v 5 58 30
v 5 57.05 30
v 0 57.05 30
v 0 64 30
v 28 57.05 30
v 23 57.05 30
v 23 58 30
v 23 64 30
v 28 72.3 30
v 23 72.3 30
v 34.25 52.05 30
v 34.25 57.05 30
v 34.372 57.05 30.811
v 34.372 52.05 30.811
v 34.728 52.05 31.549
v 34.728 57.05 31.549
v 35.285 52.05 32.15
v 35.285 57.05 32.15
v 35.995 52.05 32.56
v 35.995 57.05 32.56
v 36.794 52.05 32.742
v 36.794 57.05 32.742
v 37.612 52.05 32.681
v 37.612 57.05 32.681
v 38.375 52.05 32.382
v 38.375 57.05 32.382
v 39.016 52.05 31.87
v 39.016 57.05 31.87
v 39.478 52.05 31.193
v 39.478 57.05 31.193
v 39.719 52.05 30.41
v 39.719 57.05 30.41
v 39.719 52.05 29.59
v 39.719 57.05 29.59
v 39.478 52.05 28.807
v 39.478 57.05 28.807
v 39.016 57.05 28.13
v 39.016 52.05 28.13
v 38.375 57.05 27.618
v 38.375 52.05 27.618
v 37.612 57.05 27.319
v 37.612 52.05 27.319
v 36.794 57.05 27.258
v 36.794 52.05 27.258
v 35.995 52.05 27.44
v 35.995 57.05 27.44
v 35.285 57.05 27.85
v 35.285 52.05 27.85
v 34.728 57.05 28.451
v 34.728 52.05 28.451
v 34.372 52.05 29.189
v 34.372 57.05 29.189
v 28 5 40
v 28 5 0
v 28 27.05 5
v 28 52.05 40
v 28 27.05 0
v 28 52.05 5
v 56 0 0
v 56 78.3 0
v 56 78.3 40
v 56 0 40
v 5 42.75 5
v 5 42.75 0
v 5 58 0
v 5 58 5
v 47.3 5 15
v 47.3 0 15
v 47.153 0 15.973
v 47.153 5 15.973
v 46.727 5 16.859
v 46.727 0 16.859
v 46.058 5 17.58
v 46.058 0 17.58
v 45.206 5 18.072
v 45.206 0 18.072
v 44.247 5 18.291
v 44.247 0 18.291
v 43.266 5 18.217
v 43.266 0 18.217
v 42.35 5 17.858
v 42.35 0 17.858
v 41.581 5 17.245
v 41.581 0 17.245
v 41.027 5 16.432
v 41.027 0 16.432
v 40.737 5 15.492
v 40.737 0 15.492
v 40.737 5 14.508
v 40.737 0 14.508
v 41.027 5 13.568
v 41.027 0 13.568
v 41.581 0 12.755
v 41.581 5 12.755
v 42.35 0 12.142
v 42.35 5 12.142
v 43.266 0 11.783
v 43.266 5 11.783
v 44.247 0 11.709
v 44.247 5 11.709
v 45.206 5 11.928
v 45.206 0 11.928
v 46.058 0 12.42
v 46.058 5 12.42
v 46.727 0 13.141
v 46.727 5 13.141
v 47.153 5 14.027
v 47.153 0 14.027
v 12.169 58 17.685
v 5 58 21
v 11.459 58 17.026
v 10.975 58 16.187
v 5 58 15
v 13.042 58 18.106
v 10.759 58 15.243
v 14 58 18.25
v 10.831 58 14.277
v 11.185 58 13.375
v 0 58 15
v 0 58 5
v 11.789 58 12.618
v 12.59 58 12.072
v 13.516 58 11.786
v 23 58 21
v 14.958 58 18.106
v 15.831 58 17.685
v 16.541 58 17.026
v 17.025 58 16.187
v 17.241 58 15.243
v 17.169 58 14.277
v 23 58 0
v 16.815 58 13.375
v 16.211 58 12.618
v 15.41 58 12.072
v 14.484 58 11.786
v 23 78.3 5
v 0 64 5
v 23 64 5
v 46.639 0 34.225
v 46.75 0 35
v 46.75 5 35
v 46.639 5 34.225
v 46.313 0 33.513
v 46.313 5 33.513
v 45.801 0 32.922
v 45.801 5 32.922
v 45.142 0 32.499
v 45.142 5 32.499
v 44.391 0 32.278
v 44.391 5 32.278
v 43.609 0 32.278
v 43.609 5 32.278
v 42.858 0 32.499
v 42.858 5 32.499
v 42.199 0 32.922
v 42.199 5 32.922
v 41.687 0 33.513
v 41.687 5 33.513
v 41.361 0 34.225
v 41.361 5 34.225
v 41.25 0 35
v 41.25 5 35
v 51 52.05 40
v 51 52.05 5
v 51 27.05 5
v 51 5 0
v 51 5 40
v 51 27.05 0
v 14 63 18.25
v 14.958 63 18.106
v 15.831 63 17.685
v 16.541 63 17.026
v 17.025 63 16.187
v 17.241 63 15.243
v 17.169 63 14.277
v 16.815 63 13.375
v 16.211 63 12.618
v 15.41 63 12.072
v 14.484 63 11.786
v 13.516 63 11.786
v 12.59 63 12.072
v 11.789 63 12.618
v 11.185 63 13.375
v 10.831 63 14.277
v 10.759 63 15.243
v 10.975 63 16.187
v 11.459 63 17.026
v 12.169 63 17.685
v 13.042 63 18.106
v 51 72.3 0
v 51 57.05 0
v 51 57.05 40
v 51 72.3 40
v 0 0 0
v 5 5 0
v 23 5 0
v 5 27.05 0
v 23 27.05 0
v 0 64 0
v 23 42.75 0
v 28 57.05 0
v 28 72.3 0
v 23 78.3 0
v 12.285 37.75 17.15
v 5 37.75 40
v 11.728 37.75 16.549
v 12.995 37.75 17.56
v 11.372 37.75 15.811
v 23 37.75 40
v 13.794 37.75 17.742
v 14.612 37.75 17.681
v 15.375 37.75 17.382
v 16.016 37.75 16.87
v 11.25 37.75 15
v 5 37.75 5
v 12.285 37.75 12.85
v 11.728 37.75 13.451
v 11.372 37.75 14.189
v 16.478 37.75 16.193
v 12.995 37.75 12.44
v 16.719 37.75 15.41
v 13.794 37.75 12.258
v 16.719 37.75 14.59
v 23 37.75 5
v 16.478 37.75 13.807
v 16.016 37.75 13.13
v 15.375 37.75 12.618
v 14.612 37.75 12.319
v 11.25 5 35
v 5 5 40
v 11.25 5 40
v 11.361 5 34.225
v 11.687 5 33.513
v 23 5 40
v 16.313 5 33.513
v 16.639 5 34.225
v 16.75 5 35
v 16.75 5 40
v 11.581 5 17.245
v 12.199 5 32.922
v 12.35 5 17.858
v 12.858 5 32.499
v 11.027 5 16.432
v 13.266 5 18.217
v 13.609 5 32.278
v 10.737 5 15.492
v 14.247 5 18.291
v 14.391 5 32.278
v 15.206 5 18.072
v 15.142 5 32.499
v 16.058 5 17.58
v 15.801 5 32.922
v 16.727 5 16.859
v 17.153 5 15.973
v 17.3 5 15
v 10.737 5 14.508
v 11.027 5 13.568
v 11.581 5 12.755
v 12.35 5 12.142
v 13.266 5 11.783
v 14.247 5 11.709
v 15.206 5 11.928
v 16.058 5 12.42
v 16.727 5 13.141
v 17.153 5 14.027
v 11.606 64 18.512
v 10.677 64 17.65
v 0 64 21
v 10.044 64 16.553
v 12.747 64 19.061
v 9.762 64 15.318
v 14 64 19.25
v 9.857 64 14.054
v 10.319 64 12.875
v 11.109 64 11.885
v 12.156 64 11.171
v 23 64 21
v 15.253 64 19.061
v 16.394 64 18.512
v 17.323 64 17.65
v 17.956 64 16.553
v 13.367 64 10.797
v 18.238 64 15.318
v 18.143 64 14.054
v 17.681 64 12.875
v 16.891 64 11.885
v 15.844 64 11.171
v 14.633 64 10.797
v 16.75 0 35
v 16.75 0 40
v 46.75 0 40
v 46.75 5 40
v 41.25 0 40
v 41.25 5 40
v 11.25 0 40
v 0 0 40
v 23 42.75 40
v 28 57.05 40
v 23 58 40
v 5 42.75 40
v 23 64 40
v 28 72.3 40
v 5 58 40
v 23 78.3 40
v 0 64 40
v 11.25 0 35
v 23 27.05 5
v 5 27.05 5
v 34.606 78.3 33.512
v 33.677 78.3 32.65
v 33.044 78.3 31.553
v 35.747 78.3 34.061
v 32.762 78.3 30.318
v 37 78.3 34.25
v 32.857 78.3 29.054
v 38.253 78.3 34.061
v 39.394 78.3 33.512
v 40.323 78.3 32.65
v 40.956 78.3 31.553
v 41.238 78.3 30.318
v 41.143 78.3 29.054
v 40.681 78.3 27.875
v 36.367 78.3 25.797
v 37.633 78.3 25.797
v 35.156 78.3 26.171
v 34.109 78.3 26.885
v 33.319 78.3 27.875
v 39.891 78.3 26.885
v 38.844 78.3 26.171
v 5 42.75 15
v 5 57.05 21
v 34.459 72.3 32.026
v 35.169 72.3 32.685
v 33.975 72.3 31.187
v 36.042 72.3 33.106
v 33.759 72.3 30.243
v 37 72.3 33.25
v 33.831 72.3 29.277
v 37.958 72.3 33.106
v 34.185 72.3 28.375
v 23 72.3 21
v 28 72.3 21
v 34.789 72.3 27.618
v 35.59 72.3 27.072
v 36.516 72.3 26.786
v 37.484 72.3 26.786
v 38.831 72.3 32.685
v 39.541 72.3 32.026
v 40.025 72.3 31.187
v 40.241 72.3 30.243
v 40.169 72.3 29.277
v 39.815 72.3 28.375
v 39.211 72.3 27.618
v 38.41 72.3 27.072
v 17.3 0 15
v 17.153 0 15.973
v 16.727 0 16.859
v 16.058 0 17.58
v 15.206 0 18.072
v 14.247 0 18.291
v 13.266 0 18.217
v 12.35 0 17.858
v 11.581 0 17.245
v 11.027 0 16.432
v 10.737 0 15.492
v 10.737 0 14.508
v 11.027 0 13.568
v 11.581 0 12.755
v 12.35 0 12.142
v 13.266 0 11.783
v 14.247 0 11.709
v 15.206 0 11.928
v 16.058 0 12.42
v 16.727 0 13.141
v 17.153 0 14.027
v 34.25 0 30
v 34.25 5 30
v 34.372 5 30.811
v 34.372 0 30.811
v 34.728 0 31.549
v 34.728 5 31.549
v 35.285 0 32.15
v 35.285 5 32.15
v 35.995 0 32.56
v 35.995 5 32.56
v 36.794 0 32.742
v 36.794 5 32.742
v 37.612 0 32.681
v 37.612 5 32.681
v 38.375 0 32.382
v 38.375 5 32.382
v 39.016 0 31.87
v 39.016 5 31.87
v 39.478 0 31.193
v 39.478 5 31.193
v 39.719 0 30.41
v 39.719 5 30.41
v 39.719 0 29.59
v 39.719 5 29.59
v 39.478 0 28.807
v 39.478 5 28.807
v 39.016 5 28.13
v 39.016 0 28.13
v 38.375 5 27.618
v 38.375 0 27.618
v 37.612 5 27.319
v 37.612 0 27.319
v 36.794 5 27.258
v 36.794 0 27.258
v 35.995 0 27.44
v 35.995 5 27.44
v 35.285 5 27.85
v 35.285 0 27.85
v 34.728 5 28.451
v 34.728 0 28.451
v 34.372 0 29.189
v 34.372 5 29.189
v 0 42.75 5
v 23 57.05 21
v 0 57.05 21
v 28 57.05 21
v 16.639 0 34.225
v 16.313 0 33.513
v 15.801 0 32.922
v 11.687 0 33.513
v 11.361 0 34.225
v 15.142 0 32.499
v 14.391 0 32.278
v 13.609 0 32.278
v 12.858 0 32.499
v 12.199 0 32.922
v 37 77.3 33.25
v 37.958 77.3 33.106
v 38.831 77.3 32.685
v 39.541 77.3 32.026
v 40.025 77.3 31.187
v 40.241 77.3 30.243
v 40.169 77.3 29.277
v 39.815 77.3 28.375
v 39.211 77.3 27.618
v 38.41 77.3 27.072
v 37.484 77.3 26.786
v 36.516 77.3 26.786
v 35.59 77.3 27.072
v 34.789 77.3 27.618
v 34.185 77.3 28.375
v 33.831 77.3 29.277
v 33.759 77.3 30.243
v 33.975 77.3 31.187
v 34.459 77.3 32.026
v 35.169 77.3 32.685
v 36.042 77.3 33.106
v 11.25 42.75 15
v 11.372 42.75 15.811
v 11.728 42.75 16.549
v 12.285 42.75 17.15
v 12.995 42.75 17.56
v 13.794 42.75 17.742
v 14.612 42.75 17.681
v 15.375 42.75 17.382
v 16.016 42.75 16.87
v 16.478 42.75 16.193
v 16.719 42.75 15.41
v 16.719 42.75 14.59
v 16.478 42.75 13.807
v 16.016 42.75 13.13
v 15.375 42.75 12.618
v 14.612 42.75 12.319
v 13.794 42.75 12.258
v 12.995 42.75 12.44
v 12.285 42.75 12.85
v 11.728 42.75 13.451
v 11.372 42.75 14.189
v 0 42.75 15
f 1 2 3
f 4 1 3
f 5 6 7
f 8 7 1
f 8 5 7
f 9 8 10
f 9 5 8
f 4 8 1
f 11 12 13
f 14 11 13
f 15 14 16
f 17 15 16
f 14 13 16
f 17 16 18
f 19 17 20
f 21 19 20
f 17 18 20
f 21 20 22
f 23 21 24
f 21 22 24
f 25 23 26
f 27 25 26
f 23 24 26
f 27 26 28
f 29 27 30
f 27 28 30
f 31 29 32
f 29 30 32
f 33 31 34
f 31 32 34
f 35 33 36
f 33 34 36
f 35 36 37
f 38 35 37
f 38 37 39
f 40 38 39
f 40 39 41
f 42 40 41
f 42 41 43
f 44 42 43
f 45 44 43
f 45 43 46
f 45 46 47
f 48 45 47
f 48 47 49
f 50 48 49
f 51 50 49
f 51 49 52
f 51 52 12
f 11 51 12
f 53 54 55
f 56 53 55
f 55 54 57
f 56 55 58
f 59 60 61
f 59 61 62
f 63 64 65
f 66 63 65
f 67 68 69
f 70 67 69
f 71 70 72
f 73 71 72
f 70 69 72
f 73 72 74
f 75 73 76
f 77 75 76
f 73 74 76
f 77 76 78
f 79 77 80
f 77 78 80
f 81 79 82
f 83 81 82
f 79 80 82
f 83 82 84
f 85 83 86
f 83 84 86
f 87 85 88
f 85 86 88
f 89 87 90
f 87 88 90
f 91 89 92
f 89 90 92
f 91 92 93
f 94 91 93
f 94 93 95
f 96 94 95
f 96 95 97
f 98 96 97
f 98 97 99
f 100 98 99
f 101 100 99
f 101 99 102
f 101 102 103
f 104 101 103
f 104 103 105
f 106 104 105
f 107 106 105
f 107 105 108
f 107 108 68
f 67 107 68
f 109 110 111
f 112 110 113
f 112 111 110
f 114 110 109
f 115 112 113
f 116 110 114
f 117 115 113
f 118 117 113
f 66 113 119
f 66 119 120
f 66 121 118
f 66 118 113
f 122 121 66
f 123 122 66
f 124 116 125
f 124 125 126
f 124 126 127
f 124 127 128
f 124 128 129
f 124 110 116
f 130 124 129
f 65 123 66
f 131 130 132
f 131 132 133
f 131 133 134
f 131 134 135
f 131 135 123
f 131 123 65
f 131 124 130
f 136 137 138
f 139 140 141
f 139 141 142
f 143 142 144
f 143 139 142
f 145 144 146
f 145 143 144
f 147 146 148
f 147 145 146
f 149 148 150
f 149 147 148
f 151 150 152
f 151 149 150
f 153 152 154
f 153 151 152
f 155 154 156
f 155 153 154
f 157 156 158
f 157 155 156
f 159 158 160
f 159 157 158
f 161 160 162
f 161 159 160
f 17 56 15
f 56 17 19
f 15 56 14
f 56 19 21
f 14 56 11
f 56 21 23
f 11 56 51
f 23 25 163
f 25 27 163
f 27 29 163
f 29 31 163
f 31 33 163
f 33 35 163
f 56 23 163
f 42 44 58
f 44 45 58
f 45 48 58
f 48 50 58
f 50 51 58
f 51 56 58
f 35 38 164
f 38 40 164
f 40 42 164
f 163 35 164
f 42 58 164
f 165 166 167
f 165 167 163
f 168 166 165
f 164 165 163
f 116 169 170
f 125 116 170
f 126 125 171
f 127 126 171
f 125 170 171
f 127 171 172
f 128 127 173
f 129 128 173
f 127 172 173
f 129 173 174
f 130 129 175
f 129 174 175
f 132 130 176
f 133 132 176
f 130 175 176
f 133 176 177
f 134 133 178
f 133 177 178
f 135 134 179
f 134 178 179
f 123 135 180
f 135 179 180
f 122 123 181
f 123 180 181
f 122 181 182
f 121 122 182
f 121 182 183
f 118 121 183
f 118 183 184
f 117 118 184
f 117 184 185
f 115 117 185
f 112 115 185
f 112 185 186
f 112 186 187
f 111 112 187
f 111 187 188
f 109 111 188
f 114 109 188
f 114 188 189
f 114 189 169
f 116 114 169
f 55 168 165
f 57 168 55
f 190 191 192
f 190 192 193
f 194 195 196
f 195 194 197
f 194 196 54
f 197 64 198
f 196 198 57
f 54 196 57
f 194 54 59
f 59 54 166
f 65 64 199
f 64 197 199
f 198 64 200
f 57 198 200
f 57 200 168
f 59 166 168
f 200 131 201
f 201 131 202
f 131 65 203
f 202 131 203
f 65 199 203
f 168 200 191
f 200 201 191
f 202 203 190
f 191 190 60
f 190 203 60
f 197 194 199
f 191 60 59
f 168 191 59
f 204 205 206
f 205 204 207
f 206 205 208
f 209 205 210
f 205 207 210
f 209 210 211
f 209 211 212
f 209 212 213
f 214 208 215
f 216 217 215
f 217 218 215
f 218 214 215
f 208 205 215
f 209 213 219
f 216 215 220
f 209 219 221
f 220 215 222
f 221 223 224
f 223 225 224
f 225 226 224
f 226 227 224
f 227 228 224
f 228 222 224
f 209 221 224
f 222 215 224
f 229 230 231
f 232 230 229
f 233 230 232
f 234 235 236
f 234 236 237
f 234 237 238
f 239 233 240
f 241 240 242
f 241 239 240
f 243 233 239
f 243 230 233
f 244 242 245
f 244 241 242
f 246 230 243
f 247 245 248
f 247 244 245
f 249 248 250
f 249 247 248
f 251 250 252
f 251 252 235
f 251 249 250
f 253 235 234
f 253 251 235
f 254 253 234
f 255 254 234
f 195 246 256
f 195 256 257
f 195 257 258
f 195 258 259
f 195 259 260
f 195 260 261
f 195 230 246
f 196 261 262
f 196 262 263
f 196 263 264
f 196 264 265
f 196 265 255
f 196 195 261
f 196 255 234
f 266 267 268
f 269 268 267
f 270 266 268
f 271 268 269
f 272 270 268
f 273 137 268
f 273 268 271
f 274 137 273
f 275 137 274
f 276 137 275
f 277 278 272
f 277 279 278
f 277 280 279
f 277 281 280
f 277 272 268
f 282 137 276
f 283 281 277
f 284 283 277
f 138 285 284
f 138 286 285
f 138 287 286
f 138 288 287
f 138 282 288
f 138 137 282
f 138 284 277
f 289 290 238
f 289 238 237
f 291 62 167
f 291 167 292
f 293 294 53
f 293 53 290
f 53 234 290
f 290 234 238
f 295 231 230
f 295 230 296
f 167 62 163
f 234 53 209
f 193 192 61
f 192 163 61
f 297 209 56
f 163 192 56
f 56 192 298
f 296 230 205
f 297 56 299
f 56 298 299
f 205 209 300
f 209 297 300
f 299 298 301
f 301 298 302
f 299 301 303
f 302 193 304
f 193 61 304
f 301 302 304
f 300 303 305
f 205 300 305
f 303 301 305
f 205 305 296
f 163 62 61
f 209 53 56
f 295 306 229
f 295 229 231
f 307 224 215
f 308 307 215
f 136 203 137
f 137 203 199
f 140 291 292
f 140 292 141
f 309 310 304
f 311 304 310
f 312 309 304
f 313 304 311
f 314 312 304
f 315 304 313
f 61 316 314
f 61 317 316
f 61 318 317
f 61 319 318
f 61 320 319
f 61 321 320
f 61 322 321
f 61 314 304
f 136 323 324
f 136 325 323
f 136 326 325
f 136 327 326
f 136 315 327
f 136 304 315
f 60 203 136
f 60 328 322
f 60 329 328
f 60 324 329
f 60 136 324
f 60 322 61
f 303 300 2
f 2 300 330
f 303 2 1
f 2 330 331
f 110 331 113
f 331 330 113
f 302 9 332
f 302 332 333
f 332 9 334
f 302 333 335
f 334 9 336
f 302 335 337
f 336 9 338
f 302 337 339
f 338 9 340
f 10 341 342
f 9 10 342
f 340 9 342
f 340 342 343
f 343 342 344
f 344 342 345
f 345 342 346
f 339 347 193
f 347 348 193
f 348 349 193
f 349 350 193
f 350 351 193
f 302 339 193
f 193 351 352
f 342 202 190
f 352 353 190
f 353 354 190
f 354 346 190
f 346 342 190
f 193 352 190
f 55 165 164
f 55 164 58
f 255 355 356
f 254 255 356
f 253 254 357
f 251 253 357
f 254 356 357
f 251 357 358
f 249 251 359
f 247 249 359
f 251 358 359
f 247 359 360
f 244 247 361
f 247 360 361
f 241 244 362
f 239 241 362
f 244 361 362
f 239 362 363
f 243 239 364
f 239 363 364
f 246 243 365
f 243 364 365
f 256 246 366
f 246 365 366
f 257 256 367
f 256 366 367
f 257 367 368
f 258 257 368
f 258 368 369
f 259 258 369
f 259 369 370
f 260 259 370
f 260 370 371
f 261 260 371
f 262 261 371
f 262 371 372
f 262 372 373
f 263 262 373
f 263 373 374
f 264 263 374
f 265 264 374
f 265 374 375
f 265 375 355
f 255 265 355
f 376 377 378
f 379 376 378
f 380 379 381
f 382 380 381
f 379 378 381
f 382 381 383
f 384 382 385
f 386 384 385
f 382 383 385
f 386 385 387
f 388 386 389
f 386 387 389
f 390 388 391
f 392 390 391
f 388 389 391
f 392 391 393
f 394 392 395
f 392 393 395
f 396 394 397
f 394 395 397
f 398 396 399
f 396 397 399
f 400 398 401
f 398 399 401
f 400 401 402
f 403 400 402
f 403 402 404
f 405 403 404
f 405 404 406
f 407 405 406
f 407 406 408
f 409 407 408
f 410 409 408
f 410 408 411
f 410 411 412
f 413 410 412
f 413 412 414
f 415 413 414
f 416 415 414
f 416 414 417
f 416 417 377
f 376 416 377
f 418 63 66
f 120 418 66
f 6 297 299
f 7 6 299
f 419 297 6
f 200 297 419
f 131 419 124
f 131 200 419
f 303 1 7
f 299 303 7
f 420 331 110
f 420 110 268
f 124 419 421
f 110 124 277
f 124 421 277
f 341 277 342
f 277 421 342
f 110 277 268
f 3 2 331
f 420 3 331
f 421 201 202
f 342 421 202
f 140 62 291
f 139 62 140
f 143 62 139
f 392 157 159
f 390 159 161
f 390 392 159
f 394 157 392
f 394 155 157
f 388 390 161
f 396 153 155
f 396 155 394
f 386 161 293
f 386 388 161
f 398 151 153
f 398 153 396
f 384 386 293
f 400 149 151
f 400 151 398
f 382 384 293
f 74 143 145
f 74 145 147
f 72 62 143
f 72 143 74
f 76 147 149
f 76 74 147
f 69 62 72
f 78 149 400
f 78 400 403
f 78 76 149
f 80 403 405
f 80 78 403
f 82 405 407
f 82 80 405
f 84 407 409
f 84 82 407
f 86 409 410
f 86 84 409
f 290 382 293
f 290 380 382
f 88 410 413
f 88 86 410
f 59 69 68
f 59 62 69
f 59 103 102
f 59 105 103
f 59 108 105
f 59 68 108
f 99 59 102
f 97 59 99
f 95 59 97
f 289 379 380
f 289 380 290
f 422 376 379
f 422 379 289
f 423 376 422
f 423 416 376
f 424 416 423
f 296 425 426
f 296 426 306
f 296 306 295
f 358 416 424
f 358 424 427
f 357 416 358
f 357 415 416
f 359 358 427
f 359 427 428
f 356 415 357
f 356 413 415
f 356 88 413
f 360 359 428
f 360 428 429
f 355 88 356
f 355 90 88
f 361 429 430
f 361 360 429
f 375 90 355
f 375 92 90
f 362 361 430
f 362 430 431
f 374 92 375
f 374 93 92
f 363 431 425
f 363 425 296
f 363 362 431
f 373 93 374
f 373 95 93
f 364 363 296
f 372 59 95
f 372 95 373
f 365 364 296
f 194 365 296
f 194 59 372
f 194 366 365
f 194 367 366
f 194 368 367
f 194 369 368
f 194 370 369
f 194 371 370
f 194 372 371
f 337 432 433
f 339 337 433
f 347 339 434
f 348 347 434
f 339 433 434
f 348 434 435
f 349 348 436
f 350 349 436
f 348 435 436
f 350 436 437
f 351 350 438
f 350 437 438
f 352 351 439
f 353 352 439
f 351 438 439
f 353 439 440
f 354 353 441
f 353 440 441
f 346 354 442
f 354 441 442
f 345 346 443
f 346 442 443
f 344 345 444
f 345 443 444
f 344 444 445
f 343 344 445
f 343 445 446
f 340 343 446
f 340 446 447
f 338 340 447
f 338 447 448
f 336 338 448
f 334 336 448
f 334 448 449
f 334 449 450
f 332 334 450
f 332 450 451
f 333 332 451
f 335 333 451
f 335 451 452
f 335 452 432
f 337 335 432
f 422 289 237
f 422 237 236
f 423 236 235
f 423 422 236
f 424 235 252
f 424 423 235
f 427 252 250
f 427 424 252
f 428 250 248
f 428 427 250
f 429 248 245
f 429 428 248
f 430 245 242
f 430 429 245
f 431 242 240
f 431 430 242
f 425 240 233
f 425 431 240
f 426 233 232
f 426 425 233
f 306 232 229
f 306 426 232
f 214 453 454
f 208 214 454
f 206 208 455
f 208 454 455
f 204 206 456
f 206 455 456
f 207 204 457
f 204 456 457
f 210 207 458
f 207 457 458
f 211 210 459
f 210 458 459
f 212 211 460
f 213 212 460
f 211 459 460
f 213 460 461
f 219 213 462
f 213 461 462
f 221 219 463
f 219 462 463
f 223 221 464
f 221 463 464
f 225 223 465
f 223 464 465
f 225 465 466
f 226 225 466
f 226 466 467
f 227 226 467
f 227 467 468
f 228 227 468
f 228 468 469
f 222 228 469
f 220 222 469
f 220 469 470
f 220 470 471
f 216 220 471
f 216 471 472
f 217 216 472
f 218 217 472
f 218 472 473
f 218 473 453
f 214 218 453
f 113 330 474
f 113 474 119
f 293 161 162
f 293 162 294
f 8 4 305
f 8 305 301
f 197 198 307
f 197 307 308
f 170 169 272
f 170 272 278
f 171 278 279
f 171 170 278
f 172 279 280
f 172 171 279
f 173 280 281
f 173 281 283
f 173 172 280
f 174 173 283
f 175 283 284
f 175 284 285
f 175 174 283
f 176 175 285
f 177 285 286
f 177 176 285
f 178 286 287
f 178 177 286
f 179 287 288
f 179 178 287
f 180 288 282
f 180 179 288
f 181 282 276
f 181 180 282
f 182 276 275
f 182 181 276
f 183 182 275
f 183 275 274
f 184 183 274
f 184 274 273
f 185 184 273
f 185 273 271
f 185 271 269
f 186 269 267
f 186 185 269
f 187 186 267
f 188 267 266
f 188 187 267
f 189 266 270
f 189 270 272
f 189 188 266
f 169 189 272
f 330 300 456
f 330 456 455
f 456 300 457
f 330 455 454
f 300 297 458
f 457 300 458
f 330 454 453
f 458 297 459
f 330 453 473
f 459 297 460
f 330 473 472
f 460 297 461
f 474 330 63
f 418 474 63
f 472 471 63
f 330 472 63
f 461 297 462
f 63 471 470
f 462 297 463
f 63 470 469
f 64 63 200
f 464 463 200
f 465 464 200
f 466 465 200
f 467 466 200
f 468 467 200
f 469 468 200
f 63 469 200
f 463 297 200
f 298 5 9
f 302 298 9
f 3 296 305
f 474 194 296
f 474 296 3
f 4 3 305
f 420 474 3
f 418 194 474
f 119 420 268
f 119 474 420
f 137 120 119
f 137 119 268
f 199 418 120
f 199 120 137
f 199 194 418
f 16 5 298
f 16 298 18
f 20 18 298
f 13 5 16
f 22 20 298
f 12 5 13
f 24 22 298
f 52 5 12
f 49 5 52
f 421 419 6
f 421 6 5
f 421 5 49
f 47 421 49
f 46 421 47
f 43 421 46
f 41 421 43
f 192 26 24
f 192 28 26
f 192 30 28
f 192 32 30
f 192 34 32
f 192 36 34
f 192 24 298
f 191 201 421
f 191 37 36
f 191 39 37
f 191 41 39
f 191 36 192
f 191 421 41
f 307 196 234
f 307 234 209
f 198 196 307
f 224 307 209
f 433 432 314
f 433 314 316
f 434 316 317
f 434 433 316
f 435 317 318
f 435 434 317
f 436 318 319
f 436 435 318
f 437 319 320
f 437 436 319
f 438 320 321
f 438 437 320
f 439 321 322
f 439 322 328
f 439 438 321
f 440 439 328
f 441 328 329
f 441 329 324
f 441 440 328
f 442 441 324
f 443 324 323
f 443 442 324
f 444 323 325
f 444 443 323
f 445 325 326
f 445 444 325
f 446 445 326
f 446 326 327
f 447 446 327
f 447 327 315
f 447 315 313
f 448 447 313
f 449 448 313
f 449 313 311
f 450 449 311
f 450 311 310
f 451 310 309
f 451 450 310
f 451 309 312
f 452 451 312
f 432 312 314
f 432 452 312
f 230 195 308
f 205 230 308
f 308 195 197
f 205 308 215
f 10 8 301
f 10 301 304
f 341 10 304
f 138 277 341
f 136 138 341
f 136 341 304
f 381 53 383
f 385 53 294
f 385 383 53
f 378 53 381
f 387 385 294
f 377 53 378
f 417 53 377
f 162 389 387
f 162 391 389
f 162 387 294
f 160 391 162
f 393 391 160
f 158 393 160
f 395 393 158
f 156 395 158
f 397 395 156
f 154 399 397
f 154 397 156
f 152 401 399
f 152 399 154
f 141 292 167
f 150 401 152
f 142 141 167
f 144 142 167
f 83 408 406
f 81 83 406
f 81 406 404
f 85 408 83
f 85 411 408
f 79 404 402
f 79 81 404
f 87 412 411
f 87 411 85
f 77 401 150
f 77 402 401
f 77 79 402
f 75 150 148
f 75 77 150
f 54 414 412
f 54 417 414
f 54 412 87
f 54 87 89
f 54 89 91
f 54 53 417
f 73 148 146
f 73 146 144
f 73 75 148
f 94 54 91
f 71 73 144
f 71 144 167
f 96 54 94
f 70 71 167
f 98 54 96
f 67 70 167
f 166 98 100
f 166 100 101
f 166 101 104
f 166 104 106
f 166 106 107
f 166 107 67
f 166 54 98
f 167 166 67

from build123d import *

# Parameters (mm, degrees)
SKETCH1_W           = 18
SKETCH1_H           = 32.75
SKETCH1_W_2         = 23
SKETCH1_H_2         = 15.25
SKETCH1_H_3         = 47.05
BOSS_EXTRUDE1_DEPTH = 40
CUT_EXTRUDE1_REACH  = 106.244
SKETCH2_R           = 2.75
CUT_EXTRUDE2_REACH  = 94.276
SKETCH3_W           = 9
SKETCH3_H           = 15.25
SKETCH4_W           = 10
SKETCH4_H           = 15.25
CUT_EXTRUDE3_DEPTH  = 102.645904984
CUT_EXTRUDE4_REACH  = 106.244
SKETCH6_R           = 3.25
CHAMFER1_SIZE       = 1
CUT_EXTRUDE5_REACH  = 106.244
SKETCH7_R           = 3.3
SKETCH8_R           = 2.75
CUT_EXTRUDE6_DEPTH  = 101.542975886
SKETCH9_W           = 23
SKETCH9_H           = 25
SKETCH9_W_2         = 18
SKETCH9_H_2         = 10.7
BOSS_EXTRUDE2_DEPTH = 5


with BuildPart() as part:
    # Sketch1 → Boss-Extrude1 (new body)
    with BuildSketch(Plane.XY):
        Polygon((0, 0), (0, 64), (23, 64), (23, 78.3), (56, 78.3), (56, 0), align=None)
        with Locations((14, 21.375)):
            Rectangle(SKETCH1_W, SKETCH1_H, mode=Mode.SUBTRACT)
        with Locations((39.5, 64.675)):
            Rectangle(SKETCH1_W_2, SKETCH1_H_2, mode=Mode.SUBTRACT)
        with Locations((14, 50.375)):
            Rectangle(SKETCH1_W, SKETCH1_H_2, mode=Mode.SUBTRACT)
        with Locations((39.5, 28.525)):
            Rectangle(SKETCH1_W_2, SKETCH1_H_3, mode=Mode.SUBTRACT)
    extrude(amount=BOSS_EXTRUDE1_DEPTH)

    # Cut-Extrude1: up to this face of the body (flat: up to its plane)
    cut_extrude1_end = Plane(part.part.faces().sort_by_distance((14, 37.75, 20))[0])
    # Sketch2 → Cut-Extrude1 (cut, up to the picked face)
    with BuildSketch(Plane(origin=(0, 78.3, 0), x_dir=(1, 0, 0), z_dir=(0, 1, 0)), mode=Mode.PRIVATE) as cut_extrude1_sk1:
        with Locations(Location((14, -15, 0), (0, 0, 180))):
            Circle(SKETCH2_R)
    cut_extrude1_tool1 = split(extrude(cut_extrude1_sk1.sketch, amount=-CUT_EXTRUDE1_REACH, mode=Mode.PRIVATE), bisect_by=cut_extrude1_end, keep=Keep.BOTH, mode=Mode.PRIVATE)
    # Sketch2 → Cut-Extrude1 (cut, up to the picked face)
    with BuildSketch(Plane(origin=(0, 78.3, 0), x_dir=(1, 0, 0), z_dir=(0, 1, 0)), mode=Mode.PRIVATE) as cut_extrude1_sk2:
        with Locations(Location((37, -30, 0), (0, 0, 180))):
            Circle(SKETCH2_R)
    cut_extrude1_tool2 = split(extrude(cut_extrude1_sk2.sketch, amount=-CUT_EXTRUDE1_REACH, mode=Mode.PRIVATE), bisect_by=cut_extrude1_end, keep=Keep.BOTH, mode=Mode.PRIVATE)
    add(cut_extrude1_tool1.solids().sort_by(Axis((14, 78.3, 15), (0, -1, 0)))[0], mode=Mode.SUBTRACT)
    add(cut_extrude1_tool2.solids().sort_by(Axis((37, 78.3, 30), (0, -1, 0)))[0], mode=Mode.SUBTRACT)

    # Sketch3 → Cut-Extrude2 (cut, up to next)
    with BuildSketch(Plane(origin=(28, 0, 0), x_dir=(0, 0, -1), z_dir=(1, 0, 0)), mode=Mode.PRIVATE) as cut_extrude2_sk1:
        with Locations((-25.5, 64.675)):
            Rectangle(SKETCH3_W, SKETCH3_H)
    cut_extrude2_tool1 = extrude(cut_extrude2_sk1.sketch, amount=-CUT_EXTRUDE2_REACH, mode=Mode.PRIVATE) & part.part
    add(cut_extrude2_tool1.solids().sort_by_distance((28, 64.675, 25.5))[0], mode=Mode.SUBTRACT)

    # Sketch4 → Cut-Extrude3 (cut, through all)
    with BuildSketch(Plane(origin=(5, 0, 0), x_dir=(0, 0, -1), z_dir=(1, 0, 0))):
        with Locations((-10, 50.375)):
            Rectangle(SKETCH4_W, SKETCH4_H)
    extrude(amount=-CUT_EXTRUDE3_DEPTH, mode=Mode.SUBTRACT)

    # Sketch6 → Cut-Extrude4 (cut, up to next)
    with BuildSketch(Plane(origin=(0, 78.3, 0), x_dir=(1, 0, 0), z_dir=(0, 1, 0)), mode=Mode.PRIVATE) as cut_extrude4_sk1:
        with Locations(Location((14, -15, 0), (0, 0, 270))):
            Circle(SKETCH6_R)
    cut_extrude4_tool1 = extrude(cut_extrude4_sk1.sketch, amount=-CUT_EXTRUDE4_REACH, mode=Mode.PRIVATE) & part.part
    # Sketch6 → Cut-Extrude4 (cut, up to next)
    with BuildSketch(Plane(origin=(0, 78.3, 0), x_dir=(1, 0, 0), z_dir=(0, 1, 0)), mode=Mode.PRIVATE) as cut_extrude4_sk2:
        with Locations(Location((37, -30, 0), (0, 0, 270))):
            Circle(SKETCH6_R)
    cut_extrude4_tool2 = extrude(cut_extrude4_sk2.sketch, amount=-CUT_EXTRUDE4_REACH, mode=Mode.PRIVATE) & part.part
    add(cut_extrude4_tool1.solids().sort_by_distance((14, 78.3, 15))[0], mode=Mode.SUBTRACT)
    add(cut_extrude4_tool2.solids().sort_by_distance((37, 78.3, 30))[0], mode=Mode.SUBTRACT)

    # Chamfer1
    chamfer1_edges = [part.edges().sort_by_distance(p)[0] for p in [
        (14, 64, 11.75),
        (37, 78.3, 26.75),
    ]]
    chamfer(chamfer1_edges, length=CHAMFER1_SIZE)

    # Sketch7 → Cut-Extrude5 (cut, up to next)
    with BuildSketch(Plane.XZ, mode=Mode.PRIVATE) as cut_extrude5_sk1:
        with Locations((14, 15)):
            Circle(SKETCH7_R)
    cut_extrude5_tool1 = extrude(cut_extrude5_sk1.sketch, amount=-CUT_EXTRUDE5_REACH, mode=Mode.PRIVATE) & part.part
    # Sketch7 → Cut-Extrude5 (cut, up to next)
    with BuildSketch(Plane.XZ, mode=Mode.PRIVATE) as cut_extrude5_sk2:
        with Locations((44, 15)):
            Circle(SKETCH7_R)
    cut_extrude5_tool2 = extrude(cut_extrude5_sk2.sketch, amount=-CUT_EXTRUDE5_REACH, mode=Mode.PRIVATE) & part.part
    # Sketch7 → Cut-Extrude5 (cut, up to next)
    with BuildSketch(Plane.XZ, mode=Mode.PRIVATE) as cut_extrude5_sk3:
        with BuildLine():
            Line((11.25, 35), (11.25, 40))
            Line((11.25, 40), (16.75, 40))
            Line((16.75, 40), (16.75, 35))
            ThreePointArc((16.75, 35), (14, 32.25), (11.25, 35))
        make_face()
    cut_extrude5_tool3 = extrude(cut_extrude5_sk3.sketch, amount=-CUT_EXTRUDE5_REACH, mode=Mode.PRIVATE) & part.part
    # Sketch7 → Cut-Extrude5 (cut, up to next)
    with BuildSketch(Plane.XZ, mode=Mode.PRIVATE) as cut_extrude5_sk4:
        with BuildLine():
            Line((41.25, 35), (41.25, 40))
            Line((41.25, 40), (46.75, 40))
            Line((46.75, 40), (46.75, 35))
            ThreePointArc((46.75, 35), (44, 32.25), (41.25, 35))
        make_face()
    cut_extrude5_tool4 = extrude(cut_extrude5_sk4.sketch, amount=-CUT_EXTRUDE5_REACH, mode=Mode.PRIVATE) & part.part
    add(cut_extrude5_tool1.solids().sort_by_distance((14, 0, 15))[0], mode=Mode.SUBTRACT)
    add(cut_extrude5_tool2.solids().sort_by_distance((44, 0, 15))[0], mode=Mode.SUBTRACT)
    add(cut_extrude5_tool3.solids().sort_by_distance((14, 0, 36.393769))[0], mode=Mode.SUBTRACT)
    add(cut_extrude5_tool4.solids().sort_by_distance((44, 0, 36.393769))[0], mode=Mode.SUBTRACT)

    # Sketch8 → Cut-Extrude6 (cut, through all)
    with BuildSketch(Plane(origin=(0, 5, 0), x_dir=(1, 0, 0), z_dir=(0, 1, 0))):
        with Locations(Location((37, -30, 0), (0, 0, 180))):
            Circle(SKETCH8_R)
    extrude(amount=-CUT_EXTRUDE6_DEPTH, mode=Mode.SUBTRACT)

    # Sketch9 → Boss-Extrude2 (add)
    with BuildSketch(Plane(origin=(0, 0, 0), x_dir=(-1, 0, 0), z_dir=(0, 0, -1))):
        Polygon((-23, 78.3), (0, 64), (-23, 64), align=None)
        with Locations((-39.5, 39.55)):
            Rectangle(SKETCH9_W, SKETCH9_H)
        with Locations((-14, 32.4)):
            Rectangle(SKETCH9_W_2, SKETCH9_H_2)
    extrude(amount=-BOSS_EXTRUDE2_DEPTH)


solid = part.part
